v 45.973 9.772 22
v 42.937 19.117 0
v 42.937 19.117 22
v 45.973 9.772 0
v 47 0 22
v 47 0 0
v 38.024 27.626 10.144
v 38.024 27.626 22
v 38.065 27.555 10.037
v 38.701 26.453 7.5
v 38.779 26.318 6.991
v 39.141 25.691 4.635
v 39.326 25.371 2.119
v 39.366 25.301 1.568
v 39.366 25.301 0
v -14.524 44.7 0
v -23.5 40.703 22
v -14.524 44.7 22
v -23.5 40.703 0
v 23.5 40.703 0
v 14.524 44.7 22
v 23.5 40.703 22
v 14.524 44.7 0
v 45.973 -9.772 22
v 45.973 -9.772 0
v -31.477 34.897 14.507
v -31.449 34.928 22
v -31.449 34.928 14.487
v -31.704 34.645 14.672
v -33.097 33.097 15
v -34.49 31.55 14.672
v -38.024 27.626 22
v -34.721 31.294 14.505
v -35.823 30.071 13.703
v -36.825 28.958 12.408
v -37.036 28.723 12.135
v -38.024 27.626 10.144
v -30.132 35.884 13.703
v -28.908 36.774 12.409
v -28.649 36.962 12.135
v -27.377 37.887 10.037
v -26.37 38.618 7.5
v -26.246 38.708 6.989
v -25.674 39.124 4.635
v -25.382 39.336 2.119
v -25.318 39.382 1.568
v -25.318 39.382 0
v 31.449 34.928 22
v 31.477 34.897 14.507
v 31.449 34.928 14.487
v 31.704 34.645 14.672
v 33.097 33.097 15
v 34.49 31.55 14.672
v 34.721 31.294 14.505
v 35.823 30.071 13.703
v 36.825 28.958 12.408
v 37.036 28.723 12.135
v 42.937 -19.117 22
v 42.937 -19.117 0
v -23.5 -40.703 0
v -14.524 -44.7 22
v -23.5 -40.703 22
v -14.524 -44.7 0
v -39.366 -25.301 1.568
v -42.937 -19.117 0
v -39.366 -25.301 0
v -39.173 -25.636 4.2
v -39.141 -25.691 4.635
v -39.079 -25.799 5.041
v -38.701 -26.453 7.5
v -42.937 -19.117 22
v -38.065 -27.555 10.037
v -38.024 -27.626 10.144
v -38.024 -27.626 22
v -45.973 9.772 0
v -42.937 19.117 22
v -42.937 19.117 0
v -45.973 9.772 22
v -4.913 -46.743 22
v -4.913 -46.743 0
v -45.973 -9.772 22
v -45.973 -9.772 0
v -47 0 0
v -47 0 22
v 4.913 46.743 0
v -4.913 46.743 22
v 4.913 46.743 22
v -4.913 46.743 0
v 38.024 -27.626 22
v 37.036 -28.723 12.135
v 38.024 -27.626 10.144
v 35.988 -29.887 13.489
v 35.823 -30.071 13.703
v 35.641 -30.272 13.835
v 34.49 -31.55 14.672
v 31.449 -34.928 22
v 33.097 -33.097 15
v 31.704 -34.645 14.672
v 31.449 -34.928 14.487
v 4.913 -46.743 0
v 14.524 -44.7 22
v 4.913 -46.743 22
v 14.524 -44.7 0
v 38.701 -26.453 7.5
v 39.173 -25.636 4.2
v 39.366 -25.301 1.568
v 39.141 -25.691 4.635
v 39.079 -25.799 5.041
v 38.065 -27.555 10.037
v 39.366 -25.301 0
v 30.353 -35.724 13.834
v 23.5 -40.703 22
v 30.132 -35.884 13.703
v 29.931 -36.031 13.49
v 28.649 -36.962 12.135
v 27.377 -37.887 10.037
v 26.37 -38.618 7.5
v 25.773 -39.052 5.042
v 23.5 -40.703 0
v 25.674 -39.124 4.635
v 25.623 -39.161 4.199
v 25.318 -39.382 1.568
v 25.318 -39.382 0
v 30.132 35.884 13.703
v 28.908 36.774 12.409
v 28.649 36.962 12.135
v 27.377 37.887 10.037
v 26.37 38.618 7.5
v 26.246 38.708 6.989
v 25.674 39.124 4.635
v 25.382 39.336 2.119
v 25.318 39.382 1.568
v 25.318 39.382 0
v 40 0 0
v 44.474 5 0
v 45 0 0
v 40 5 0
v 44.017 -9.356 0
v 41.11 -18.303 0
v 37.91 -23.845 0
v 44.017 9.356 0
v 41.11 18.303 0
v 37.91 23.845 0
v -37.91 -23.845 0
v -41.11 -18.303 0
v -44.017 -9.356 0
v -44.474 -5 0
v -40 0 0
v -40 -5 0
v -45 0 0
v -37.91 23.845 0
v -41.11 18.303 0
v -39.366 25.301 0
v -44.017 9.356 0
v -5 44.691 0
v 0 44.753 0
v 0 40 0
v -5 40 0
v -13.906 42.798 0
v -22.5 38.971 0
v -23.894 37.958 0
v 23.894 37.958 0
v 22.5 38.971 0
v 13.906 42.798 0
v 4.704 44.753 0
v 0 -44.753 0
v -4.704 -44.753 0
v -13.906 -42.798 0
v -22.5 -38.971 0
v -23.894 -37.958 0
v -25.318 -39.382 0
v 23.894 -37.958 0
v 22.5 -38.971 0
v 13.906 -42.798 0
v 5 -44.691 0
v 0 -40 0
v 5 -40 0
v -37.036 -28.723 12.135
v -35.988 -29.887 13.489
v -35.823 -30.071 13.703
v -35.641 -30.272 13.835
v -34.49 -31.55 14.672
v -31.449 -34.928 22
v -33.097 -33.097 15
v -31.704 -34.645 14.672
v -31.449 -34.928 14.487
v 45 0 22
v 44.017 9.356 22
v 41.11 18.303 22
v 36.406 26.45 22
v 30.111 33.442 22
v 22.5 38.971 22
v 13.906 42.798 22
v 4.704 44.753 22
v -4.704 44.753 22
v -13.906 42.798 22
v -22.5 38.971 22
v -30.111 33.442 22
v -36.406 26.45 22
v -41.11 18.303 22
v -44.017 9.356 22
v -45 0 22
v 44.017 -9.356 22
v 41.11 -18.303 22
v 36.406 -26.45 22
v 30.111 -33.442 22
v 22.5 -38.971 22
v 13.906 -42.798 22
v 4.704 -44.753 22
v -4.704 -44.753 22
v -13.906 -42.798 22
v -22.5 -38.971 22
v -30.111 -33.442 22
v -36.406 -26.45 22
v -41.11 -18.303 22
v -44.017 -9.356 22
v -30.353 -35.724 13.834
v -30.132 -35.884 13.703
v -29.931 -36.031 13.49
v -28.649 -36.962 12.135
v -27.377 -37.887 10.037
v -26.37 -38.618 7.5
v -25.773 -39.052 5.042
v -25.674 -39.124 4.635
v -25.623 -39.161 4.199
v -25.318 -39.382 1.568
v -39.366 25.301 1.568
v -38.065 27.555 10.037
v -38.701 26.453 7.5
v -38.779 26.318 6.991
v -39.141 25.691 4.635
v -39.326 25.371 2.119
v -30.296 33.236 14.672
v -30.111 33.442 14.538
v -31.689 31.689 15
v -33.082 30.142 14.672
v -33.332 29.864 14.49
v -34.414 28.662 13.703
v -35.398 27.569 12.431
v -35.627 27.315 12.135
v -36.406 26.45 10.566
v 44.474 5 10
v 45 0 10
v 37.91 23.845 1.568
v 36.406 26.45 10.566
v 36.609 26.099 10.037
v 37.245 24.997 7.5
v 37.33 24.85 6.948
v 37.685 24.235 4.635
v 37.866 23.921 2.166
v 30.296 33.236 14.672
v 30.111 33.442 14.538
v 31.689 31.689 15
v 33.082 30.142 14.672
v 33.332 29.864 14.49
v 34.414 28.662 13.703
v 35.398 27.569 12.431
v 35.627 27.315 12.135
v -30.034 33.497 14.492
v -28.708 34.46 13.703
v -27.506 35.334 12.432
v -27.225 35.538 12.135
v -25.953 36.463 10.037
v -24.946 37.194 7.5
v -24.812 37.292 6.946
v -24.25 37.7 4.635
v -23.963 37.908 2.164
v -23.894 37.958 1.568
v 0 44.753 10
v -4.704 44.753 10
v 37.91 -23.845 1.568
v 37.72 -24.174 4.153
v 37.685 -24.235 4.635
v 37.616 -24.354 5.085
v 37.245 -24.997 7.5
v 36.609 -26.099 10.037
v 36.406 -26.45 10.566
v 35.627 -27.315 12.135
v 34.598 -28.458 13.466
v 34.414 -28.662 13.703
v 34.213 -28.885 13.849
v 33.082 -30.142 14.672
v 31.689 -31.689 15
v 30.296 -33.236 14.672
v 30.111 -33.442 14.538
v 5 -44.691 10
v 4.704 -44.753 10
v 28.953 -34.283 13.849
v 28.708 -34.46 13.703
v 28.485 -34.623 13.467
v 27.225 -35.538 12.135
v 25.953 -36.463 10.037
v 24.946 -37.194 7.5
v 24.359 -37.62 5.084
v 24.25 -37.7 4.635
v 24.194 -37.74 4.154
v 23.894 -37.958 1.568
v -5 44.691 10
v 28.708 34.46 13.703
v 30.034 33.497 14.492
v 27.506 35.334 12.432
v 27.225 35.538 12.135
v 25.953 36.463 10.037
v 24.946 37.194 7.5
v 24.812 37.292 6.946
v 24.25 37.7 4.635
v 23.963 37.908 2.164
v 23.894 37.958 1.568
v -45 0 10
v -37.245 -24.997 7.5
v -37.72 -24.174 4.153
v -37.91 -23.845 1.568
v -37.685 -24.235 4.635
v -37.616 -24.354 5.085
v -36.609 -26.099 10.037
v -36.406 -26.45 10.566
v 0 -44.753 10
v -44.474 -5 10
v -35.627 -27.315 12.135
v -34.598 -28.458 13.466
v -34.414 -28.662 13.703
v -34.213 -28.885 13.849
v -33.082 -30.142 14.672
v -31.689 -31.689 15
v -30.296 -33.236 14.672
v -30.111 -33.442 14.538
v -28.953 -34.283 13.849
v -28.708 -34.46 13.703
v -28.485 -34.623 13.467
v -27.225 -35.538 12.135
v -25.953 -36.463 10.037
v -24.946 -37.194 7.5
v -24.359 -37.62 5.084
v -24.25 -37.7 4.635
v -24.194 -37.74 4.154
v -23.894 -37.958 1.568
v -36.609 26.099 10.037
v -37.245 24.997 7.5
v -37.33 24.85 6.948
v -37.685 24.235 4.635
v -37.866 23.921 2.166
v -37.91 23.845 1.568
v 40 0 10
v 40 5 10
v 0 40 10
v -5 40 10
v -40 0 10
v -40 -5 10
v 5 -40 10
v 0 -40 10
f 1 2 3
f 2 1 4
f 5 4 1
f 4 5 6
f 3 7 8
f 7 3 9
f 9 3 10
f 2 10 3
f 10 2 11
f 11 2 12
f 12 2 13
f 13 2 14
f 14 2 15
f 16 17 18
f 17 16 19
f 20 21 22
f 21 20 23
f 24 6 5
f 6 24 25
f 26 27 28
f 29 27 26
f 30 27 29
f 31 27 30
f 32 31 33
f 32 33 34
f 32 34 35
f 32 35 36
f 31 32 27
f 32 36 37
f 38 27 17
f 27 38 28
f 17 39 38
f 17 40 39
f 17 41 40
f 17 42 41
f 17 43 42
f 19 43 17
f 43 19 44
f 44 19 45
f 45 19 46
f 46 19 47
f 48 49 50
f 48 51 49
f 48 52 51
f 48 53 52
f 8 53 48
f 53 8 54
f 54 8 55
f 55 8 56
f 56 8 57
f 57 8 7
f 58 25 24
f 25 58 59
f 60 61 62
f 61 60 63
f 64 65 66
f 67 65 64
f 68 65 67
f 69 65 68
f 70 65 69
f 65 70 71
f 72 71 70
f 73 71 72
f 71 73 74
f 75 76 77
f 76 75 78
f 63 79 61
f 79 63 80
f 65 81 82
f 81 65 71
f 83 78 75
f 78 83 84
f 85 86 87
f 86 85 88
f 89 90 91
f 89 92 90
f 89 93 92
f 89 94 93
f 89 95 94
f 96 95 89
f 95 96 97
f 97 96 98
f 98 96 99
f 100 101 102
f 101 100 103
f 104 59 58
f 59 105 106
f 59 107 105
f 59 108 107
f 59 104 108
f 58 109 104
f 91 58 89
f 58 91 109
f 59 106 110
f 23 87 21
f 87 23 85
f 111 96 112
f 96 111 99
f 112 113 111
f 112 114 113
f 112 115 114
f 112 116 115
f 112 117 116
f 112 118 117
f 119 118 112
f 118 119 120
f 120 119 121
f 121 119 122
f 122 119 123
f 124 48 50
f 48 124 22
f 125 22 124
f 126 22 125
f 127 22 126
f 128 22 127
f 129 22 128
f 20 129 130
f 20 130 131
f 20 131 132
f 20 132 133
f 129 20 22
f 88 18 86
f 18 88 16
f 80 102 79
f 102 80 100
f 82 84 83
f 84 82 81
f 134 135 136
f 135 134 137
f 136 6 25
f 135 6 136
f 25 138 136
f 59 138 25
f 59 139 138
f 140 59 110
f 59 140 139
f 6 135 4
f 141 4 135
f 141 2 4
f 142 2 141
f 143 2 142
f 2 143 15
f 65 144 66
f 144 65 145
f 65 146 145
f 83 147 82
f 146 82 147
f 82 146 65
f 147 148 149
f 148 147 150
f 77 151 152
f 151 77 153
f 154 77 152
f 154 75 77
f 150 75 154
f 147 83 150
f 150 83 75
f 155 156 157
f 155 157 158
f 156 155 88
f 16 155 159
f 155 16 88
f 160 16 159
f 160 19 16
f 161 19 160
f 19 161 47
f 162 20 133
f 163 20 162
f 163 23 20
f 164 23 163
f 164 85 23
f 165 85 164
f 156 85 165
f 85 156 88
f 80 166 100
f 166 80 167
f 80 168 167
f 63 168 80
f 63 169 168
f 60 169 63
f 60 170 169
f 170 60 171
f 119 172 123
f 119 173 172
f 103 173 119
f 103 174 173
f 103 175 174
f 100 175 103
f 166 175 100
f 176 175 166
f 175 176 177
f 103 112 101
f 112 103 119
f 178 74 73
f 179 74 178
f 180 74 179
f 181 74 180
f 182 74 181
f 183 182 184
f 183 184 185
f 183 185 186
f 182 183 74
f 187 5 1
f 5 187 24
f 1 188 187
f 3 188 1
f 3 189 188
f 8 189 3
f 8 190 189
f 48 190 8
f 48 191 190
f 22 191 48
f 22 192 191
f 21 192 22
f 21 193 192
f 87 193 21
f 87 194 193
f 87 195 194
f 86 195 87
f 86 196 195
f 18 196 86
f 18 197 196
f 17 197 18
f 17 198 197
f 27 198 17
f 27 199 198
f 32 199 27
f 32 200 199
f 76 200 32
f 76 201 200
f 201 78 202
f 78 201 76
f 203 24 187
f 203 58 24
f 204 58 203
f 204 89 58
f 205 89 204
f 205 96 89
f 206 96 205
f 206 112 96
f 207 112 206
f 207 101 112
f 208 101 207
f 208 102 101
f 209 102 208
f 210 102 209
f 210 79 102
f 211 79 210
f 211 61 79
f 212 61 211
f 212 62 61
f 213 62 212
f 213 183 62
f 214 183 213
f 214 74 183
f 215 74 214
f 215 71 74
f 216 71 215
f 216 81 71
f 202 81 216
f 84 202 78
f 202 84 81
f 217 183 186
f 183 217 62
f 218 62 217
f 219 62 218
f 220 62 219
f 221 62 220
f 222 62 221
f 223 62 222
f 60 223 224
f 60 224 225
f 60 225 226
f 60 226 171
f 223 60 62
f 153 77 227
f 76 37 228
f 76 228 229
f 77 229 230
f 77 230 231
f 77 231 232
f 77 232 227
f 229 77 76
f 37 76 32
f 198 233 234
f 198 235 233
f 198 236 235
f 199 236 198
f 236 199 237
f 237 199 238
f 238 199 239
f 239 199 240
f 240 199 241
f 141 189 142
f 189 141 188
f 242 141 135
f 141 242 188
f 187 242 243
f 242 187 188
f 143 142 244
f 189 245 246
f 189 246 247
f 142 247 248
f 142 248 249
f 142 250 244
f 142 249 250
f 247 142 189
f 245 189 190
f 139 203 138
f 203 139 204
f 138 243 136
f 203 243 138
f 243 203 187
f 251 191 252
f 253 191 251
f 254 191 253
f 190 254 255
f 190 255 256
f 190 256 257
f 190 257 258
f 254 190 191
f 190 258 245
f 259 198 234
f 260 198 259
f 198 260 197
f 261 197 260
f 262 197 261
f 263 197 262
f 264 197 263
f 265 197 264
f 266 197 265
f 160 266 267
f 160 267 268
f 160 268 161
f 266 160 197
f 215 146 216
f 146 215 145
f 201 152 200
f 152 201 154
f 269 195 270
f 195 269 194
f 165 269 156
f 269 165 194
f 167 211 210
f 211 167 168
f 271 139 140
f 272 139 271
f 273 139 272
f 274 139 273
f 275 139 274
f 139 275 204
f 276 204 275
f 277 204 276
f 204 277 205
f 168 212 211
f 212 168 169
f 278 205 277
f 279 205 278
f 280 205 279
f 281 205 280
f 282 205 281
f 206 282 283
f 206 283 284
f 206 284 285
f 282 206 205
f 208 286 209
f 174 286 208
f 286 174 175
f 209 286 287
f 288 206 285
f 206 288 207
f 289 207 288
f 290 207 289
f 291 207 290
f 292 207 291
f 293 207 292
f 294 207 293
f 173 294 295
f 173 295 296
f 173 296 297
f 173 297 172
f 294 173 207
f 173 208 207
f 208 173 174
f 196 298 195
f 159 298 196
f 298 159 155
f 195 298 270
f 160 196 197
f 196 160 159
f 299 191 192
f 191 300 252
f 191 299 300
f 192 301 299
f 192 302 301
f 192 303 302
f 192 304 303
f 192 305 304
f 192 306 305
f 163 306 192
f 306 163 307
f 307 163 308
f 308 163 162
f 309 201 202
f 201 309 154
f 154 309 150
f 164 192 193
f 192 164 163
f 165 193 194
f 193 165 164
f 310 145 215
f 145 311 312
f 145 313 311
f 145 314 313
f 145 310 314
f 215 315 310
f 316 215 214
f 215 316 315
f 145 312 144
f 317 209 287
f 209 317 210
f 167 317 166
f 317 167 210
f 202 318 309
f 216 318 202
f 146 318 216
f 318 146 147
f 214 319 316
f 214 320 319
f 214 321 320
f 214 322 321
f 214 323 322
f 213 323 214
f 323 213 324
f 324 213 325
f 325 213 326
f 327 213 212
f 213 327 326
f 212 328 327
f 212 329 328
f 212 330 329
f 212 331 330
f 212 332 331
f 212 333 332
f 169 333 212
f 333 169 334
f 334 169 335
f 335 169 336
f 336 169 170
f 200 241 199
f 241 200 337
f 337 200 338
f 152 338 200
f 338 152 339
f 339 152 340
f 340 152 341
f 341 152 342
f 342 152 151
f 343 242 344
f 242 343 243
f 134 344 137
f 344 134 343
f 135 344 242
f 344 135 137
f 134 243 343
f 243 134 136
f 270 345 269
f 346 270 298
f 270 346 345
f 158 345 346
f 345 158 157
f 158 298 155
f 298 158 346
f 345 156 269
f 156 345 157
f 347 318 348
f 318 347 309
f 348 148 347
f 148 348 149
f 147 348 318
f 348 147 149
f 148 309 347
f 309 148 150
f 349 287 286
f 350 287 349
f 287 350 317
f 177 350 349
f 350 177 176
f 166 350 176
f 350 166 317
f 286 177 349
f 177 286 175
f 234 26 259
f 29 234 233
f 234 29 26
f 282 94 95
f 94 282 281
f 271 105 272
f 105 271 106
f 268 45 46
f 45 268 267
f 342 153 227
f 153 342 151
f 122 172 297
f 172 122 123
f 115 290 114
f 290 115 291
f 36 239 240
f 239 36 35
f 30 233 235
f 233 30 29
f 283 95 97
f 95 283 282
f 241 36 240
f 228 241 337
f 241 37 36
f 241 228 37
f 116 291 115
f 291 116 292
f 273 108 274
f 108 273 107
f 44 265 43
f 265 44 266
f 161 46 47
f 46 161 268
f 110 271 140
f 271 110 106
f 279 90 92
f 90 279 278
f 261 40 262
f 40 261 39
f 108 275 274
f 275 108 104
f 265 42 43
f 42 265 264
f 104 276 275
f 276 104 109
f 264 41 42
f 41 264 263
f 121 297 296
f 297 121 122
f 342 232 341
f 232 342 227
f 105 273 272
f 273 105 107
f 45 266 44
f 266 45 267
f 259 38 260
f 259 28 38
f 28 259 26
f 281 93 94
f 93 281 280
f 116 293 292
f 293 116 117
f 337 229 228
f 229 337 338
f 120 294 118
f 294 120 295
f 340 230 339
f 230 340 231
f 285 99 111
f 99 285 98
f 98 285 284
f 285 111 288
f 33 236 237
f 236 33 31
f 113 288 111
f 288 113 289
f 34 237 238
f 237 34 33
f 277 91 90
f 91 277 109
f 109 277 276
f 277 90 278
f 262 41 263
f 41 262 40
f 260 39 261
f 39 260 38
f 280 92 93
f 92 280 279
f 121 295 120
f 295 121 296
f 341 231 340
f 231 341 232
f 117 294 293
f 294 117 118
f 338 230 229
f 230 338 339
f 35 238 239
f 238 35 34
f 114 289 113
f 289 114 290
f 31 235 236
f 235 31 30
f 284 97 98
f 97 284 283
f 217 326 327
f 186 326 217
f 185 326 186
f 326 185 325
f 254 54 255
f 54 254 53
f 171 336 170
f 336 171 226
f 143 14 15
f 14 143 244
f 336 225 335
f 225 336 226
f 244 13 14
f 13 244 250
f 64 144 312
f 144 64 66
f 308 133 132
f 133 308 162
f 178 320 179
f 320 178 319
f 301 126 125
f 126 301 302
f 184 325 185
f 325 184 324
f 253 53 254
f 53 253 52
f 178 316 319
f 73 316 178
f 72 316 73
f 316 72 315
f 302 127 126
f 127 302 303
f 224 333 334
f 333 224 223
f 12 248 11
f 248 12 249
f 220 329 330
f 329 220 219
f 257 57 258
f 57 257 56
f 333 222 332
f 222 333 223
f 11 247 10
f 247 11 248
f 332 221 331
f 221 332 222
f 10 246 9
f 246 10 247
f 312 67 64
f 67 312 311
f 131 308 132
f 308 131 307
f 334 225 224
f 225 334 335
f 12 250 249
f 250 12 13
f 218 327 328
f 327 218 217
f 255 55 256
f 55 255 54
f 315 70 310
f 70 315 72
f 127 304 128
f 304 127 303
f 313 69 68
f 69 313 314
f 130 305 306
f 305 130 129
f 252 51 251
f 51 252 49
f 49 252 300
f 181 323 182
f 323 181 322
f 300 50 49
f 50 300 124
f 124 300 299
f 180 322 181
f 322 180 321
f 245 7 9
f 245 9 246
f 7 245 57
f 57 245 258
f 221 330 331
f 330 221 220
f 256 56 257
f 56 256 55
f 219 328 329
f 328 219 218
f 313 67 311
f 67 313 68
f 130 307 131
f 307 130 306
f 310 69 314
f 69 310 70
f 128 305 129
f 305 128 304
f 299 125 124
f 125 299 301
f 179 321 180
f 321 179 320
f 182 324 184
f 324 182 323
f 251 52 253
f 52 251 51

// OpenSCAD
//Inner Diameter
innerDiameter=90; // diameter in mm
innerRadius=innerDiameter/2;

//Wall thickness
wall = 2; //wall thickness in mm

//Height 
height=22; // height in mm, must be greater than 15.

difference(){
union(){
    difference(){
    cylinder(r=innerRadius+wall,h=height);
    cylinder(r=innerRadius,h=height);
    };
    for (i=[0:3])
        rotate(i*90)
    translate([innerRadius-5,0,0])cube([5,5,10]);
}
union(){
translate([-innerRadius*1.1,innerRadius*1.1,0])
rotate([45,90,0])
    scale([1.5,1,1])cylinder(r=10,h=innerRadius*3);
 translate([innerRadius*1.1,innerRadius*1.1,0])
rotate([180-45,90,0])
    scale([1.5,1,1])cylinder(r=10,h=innerRadius*3);
}   
}
